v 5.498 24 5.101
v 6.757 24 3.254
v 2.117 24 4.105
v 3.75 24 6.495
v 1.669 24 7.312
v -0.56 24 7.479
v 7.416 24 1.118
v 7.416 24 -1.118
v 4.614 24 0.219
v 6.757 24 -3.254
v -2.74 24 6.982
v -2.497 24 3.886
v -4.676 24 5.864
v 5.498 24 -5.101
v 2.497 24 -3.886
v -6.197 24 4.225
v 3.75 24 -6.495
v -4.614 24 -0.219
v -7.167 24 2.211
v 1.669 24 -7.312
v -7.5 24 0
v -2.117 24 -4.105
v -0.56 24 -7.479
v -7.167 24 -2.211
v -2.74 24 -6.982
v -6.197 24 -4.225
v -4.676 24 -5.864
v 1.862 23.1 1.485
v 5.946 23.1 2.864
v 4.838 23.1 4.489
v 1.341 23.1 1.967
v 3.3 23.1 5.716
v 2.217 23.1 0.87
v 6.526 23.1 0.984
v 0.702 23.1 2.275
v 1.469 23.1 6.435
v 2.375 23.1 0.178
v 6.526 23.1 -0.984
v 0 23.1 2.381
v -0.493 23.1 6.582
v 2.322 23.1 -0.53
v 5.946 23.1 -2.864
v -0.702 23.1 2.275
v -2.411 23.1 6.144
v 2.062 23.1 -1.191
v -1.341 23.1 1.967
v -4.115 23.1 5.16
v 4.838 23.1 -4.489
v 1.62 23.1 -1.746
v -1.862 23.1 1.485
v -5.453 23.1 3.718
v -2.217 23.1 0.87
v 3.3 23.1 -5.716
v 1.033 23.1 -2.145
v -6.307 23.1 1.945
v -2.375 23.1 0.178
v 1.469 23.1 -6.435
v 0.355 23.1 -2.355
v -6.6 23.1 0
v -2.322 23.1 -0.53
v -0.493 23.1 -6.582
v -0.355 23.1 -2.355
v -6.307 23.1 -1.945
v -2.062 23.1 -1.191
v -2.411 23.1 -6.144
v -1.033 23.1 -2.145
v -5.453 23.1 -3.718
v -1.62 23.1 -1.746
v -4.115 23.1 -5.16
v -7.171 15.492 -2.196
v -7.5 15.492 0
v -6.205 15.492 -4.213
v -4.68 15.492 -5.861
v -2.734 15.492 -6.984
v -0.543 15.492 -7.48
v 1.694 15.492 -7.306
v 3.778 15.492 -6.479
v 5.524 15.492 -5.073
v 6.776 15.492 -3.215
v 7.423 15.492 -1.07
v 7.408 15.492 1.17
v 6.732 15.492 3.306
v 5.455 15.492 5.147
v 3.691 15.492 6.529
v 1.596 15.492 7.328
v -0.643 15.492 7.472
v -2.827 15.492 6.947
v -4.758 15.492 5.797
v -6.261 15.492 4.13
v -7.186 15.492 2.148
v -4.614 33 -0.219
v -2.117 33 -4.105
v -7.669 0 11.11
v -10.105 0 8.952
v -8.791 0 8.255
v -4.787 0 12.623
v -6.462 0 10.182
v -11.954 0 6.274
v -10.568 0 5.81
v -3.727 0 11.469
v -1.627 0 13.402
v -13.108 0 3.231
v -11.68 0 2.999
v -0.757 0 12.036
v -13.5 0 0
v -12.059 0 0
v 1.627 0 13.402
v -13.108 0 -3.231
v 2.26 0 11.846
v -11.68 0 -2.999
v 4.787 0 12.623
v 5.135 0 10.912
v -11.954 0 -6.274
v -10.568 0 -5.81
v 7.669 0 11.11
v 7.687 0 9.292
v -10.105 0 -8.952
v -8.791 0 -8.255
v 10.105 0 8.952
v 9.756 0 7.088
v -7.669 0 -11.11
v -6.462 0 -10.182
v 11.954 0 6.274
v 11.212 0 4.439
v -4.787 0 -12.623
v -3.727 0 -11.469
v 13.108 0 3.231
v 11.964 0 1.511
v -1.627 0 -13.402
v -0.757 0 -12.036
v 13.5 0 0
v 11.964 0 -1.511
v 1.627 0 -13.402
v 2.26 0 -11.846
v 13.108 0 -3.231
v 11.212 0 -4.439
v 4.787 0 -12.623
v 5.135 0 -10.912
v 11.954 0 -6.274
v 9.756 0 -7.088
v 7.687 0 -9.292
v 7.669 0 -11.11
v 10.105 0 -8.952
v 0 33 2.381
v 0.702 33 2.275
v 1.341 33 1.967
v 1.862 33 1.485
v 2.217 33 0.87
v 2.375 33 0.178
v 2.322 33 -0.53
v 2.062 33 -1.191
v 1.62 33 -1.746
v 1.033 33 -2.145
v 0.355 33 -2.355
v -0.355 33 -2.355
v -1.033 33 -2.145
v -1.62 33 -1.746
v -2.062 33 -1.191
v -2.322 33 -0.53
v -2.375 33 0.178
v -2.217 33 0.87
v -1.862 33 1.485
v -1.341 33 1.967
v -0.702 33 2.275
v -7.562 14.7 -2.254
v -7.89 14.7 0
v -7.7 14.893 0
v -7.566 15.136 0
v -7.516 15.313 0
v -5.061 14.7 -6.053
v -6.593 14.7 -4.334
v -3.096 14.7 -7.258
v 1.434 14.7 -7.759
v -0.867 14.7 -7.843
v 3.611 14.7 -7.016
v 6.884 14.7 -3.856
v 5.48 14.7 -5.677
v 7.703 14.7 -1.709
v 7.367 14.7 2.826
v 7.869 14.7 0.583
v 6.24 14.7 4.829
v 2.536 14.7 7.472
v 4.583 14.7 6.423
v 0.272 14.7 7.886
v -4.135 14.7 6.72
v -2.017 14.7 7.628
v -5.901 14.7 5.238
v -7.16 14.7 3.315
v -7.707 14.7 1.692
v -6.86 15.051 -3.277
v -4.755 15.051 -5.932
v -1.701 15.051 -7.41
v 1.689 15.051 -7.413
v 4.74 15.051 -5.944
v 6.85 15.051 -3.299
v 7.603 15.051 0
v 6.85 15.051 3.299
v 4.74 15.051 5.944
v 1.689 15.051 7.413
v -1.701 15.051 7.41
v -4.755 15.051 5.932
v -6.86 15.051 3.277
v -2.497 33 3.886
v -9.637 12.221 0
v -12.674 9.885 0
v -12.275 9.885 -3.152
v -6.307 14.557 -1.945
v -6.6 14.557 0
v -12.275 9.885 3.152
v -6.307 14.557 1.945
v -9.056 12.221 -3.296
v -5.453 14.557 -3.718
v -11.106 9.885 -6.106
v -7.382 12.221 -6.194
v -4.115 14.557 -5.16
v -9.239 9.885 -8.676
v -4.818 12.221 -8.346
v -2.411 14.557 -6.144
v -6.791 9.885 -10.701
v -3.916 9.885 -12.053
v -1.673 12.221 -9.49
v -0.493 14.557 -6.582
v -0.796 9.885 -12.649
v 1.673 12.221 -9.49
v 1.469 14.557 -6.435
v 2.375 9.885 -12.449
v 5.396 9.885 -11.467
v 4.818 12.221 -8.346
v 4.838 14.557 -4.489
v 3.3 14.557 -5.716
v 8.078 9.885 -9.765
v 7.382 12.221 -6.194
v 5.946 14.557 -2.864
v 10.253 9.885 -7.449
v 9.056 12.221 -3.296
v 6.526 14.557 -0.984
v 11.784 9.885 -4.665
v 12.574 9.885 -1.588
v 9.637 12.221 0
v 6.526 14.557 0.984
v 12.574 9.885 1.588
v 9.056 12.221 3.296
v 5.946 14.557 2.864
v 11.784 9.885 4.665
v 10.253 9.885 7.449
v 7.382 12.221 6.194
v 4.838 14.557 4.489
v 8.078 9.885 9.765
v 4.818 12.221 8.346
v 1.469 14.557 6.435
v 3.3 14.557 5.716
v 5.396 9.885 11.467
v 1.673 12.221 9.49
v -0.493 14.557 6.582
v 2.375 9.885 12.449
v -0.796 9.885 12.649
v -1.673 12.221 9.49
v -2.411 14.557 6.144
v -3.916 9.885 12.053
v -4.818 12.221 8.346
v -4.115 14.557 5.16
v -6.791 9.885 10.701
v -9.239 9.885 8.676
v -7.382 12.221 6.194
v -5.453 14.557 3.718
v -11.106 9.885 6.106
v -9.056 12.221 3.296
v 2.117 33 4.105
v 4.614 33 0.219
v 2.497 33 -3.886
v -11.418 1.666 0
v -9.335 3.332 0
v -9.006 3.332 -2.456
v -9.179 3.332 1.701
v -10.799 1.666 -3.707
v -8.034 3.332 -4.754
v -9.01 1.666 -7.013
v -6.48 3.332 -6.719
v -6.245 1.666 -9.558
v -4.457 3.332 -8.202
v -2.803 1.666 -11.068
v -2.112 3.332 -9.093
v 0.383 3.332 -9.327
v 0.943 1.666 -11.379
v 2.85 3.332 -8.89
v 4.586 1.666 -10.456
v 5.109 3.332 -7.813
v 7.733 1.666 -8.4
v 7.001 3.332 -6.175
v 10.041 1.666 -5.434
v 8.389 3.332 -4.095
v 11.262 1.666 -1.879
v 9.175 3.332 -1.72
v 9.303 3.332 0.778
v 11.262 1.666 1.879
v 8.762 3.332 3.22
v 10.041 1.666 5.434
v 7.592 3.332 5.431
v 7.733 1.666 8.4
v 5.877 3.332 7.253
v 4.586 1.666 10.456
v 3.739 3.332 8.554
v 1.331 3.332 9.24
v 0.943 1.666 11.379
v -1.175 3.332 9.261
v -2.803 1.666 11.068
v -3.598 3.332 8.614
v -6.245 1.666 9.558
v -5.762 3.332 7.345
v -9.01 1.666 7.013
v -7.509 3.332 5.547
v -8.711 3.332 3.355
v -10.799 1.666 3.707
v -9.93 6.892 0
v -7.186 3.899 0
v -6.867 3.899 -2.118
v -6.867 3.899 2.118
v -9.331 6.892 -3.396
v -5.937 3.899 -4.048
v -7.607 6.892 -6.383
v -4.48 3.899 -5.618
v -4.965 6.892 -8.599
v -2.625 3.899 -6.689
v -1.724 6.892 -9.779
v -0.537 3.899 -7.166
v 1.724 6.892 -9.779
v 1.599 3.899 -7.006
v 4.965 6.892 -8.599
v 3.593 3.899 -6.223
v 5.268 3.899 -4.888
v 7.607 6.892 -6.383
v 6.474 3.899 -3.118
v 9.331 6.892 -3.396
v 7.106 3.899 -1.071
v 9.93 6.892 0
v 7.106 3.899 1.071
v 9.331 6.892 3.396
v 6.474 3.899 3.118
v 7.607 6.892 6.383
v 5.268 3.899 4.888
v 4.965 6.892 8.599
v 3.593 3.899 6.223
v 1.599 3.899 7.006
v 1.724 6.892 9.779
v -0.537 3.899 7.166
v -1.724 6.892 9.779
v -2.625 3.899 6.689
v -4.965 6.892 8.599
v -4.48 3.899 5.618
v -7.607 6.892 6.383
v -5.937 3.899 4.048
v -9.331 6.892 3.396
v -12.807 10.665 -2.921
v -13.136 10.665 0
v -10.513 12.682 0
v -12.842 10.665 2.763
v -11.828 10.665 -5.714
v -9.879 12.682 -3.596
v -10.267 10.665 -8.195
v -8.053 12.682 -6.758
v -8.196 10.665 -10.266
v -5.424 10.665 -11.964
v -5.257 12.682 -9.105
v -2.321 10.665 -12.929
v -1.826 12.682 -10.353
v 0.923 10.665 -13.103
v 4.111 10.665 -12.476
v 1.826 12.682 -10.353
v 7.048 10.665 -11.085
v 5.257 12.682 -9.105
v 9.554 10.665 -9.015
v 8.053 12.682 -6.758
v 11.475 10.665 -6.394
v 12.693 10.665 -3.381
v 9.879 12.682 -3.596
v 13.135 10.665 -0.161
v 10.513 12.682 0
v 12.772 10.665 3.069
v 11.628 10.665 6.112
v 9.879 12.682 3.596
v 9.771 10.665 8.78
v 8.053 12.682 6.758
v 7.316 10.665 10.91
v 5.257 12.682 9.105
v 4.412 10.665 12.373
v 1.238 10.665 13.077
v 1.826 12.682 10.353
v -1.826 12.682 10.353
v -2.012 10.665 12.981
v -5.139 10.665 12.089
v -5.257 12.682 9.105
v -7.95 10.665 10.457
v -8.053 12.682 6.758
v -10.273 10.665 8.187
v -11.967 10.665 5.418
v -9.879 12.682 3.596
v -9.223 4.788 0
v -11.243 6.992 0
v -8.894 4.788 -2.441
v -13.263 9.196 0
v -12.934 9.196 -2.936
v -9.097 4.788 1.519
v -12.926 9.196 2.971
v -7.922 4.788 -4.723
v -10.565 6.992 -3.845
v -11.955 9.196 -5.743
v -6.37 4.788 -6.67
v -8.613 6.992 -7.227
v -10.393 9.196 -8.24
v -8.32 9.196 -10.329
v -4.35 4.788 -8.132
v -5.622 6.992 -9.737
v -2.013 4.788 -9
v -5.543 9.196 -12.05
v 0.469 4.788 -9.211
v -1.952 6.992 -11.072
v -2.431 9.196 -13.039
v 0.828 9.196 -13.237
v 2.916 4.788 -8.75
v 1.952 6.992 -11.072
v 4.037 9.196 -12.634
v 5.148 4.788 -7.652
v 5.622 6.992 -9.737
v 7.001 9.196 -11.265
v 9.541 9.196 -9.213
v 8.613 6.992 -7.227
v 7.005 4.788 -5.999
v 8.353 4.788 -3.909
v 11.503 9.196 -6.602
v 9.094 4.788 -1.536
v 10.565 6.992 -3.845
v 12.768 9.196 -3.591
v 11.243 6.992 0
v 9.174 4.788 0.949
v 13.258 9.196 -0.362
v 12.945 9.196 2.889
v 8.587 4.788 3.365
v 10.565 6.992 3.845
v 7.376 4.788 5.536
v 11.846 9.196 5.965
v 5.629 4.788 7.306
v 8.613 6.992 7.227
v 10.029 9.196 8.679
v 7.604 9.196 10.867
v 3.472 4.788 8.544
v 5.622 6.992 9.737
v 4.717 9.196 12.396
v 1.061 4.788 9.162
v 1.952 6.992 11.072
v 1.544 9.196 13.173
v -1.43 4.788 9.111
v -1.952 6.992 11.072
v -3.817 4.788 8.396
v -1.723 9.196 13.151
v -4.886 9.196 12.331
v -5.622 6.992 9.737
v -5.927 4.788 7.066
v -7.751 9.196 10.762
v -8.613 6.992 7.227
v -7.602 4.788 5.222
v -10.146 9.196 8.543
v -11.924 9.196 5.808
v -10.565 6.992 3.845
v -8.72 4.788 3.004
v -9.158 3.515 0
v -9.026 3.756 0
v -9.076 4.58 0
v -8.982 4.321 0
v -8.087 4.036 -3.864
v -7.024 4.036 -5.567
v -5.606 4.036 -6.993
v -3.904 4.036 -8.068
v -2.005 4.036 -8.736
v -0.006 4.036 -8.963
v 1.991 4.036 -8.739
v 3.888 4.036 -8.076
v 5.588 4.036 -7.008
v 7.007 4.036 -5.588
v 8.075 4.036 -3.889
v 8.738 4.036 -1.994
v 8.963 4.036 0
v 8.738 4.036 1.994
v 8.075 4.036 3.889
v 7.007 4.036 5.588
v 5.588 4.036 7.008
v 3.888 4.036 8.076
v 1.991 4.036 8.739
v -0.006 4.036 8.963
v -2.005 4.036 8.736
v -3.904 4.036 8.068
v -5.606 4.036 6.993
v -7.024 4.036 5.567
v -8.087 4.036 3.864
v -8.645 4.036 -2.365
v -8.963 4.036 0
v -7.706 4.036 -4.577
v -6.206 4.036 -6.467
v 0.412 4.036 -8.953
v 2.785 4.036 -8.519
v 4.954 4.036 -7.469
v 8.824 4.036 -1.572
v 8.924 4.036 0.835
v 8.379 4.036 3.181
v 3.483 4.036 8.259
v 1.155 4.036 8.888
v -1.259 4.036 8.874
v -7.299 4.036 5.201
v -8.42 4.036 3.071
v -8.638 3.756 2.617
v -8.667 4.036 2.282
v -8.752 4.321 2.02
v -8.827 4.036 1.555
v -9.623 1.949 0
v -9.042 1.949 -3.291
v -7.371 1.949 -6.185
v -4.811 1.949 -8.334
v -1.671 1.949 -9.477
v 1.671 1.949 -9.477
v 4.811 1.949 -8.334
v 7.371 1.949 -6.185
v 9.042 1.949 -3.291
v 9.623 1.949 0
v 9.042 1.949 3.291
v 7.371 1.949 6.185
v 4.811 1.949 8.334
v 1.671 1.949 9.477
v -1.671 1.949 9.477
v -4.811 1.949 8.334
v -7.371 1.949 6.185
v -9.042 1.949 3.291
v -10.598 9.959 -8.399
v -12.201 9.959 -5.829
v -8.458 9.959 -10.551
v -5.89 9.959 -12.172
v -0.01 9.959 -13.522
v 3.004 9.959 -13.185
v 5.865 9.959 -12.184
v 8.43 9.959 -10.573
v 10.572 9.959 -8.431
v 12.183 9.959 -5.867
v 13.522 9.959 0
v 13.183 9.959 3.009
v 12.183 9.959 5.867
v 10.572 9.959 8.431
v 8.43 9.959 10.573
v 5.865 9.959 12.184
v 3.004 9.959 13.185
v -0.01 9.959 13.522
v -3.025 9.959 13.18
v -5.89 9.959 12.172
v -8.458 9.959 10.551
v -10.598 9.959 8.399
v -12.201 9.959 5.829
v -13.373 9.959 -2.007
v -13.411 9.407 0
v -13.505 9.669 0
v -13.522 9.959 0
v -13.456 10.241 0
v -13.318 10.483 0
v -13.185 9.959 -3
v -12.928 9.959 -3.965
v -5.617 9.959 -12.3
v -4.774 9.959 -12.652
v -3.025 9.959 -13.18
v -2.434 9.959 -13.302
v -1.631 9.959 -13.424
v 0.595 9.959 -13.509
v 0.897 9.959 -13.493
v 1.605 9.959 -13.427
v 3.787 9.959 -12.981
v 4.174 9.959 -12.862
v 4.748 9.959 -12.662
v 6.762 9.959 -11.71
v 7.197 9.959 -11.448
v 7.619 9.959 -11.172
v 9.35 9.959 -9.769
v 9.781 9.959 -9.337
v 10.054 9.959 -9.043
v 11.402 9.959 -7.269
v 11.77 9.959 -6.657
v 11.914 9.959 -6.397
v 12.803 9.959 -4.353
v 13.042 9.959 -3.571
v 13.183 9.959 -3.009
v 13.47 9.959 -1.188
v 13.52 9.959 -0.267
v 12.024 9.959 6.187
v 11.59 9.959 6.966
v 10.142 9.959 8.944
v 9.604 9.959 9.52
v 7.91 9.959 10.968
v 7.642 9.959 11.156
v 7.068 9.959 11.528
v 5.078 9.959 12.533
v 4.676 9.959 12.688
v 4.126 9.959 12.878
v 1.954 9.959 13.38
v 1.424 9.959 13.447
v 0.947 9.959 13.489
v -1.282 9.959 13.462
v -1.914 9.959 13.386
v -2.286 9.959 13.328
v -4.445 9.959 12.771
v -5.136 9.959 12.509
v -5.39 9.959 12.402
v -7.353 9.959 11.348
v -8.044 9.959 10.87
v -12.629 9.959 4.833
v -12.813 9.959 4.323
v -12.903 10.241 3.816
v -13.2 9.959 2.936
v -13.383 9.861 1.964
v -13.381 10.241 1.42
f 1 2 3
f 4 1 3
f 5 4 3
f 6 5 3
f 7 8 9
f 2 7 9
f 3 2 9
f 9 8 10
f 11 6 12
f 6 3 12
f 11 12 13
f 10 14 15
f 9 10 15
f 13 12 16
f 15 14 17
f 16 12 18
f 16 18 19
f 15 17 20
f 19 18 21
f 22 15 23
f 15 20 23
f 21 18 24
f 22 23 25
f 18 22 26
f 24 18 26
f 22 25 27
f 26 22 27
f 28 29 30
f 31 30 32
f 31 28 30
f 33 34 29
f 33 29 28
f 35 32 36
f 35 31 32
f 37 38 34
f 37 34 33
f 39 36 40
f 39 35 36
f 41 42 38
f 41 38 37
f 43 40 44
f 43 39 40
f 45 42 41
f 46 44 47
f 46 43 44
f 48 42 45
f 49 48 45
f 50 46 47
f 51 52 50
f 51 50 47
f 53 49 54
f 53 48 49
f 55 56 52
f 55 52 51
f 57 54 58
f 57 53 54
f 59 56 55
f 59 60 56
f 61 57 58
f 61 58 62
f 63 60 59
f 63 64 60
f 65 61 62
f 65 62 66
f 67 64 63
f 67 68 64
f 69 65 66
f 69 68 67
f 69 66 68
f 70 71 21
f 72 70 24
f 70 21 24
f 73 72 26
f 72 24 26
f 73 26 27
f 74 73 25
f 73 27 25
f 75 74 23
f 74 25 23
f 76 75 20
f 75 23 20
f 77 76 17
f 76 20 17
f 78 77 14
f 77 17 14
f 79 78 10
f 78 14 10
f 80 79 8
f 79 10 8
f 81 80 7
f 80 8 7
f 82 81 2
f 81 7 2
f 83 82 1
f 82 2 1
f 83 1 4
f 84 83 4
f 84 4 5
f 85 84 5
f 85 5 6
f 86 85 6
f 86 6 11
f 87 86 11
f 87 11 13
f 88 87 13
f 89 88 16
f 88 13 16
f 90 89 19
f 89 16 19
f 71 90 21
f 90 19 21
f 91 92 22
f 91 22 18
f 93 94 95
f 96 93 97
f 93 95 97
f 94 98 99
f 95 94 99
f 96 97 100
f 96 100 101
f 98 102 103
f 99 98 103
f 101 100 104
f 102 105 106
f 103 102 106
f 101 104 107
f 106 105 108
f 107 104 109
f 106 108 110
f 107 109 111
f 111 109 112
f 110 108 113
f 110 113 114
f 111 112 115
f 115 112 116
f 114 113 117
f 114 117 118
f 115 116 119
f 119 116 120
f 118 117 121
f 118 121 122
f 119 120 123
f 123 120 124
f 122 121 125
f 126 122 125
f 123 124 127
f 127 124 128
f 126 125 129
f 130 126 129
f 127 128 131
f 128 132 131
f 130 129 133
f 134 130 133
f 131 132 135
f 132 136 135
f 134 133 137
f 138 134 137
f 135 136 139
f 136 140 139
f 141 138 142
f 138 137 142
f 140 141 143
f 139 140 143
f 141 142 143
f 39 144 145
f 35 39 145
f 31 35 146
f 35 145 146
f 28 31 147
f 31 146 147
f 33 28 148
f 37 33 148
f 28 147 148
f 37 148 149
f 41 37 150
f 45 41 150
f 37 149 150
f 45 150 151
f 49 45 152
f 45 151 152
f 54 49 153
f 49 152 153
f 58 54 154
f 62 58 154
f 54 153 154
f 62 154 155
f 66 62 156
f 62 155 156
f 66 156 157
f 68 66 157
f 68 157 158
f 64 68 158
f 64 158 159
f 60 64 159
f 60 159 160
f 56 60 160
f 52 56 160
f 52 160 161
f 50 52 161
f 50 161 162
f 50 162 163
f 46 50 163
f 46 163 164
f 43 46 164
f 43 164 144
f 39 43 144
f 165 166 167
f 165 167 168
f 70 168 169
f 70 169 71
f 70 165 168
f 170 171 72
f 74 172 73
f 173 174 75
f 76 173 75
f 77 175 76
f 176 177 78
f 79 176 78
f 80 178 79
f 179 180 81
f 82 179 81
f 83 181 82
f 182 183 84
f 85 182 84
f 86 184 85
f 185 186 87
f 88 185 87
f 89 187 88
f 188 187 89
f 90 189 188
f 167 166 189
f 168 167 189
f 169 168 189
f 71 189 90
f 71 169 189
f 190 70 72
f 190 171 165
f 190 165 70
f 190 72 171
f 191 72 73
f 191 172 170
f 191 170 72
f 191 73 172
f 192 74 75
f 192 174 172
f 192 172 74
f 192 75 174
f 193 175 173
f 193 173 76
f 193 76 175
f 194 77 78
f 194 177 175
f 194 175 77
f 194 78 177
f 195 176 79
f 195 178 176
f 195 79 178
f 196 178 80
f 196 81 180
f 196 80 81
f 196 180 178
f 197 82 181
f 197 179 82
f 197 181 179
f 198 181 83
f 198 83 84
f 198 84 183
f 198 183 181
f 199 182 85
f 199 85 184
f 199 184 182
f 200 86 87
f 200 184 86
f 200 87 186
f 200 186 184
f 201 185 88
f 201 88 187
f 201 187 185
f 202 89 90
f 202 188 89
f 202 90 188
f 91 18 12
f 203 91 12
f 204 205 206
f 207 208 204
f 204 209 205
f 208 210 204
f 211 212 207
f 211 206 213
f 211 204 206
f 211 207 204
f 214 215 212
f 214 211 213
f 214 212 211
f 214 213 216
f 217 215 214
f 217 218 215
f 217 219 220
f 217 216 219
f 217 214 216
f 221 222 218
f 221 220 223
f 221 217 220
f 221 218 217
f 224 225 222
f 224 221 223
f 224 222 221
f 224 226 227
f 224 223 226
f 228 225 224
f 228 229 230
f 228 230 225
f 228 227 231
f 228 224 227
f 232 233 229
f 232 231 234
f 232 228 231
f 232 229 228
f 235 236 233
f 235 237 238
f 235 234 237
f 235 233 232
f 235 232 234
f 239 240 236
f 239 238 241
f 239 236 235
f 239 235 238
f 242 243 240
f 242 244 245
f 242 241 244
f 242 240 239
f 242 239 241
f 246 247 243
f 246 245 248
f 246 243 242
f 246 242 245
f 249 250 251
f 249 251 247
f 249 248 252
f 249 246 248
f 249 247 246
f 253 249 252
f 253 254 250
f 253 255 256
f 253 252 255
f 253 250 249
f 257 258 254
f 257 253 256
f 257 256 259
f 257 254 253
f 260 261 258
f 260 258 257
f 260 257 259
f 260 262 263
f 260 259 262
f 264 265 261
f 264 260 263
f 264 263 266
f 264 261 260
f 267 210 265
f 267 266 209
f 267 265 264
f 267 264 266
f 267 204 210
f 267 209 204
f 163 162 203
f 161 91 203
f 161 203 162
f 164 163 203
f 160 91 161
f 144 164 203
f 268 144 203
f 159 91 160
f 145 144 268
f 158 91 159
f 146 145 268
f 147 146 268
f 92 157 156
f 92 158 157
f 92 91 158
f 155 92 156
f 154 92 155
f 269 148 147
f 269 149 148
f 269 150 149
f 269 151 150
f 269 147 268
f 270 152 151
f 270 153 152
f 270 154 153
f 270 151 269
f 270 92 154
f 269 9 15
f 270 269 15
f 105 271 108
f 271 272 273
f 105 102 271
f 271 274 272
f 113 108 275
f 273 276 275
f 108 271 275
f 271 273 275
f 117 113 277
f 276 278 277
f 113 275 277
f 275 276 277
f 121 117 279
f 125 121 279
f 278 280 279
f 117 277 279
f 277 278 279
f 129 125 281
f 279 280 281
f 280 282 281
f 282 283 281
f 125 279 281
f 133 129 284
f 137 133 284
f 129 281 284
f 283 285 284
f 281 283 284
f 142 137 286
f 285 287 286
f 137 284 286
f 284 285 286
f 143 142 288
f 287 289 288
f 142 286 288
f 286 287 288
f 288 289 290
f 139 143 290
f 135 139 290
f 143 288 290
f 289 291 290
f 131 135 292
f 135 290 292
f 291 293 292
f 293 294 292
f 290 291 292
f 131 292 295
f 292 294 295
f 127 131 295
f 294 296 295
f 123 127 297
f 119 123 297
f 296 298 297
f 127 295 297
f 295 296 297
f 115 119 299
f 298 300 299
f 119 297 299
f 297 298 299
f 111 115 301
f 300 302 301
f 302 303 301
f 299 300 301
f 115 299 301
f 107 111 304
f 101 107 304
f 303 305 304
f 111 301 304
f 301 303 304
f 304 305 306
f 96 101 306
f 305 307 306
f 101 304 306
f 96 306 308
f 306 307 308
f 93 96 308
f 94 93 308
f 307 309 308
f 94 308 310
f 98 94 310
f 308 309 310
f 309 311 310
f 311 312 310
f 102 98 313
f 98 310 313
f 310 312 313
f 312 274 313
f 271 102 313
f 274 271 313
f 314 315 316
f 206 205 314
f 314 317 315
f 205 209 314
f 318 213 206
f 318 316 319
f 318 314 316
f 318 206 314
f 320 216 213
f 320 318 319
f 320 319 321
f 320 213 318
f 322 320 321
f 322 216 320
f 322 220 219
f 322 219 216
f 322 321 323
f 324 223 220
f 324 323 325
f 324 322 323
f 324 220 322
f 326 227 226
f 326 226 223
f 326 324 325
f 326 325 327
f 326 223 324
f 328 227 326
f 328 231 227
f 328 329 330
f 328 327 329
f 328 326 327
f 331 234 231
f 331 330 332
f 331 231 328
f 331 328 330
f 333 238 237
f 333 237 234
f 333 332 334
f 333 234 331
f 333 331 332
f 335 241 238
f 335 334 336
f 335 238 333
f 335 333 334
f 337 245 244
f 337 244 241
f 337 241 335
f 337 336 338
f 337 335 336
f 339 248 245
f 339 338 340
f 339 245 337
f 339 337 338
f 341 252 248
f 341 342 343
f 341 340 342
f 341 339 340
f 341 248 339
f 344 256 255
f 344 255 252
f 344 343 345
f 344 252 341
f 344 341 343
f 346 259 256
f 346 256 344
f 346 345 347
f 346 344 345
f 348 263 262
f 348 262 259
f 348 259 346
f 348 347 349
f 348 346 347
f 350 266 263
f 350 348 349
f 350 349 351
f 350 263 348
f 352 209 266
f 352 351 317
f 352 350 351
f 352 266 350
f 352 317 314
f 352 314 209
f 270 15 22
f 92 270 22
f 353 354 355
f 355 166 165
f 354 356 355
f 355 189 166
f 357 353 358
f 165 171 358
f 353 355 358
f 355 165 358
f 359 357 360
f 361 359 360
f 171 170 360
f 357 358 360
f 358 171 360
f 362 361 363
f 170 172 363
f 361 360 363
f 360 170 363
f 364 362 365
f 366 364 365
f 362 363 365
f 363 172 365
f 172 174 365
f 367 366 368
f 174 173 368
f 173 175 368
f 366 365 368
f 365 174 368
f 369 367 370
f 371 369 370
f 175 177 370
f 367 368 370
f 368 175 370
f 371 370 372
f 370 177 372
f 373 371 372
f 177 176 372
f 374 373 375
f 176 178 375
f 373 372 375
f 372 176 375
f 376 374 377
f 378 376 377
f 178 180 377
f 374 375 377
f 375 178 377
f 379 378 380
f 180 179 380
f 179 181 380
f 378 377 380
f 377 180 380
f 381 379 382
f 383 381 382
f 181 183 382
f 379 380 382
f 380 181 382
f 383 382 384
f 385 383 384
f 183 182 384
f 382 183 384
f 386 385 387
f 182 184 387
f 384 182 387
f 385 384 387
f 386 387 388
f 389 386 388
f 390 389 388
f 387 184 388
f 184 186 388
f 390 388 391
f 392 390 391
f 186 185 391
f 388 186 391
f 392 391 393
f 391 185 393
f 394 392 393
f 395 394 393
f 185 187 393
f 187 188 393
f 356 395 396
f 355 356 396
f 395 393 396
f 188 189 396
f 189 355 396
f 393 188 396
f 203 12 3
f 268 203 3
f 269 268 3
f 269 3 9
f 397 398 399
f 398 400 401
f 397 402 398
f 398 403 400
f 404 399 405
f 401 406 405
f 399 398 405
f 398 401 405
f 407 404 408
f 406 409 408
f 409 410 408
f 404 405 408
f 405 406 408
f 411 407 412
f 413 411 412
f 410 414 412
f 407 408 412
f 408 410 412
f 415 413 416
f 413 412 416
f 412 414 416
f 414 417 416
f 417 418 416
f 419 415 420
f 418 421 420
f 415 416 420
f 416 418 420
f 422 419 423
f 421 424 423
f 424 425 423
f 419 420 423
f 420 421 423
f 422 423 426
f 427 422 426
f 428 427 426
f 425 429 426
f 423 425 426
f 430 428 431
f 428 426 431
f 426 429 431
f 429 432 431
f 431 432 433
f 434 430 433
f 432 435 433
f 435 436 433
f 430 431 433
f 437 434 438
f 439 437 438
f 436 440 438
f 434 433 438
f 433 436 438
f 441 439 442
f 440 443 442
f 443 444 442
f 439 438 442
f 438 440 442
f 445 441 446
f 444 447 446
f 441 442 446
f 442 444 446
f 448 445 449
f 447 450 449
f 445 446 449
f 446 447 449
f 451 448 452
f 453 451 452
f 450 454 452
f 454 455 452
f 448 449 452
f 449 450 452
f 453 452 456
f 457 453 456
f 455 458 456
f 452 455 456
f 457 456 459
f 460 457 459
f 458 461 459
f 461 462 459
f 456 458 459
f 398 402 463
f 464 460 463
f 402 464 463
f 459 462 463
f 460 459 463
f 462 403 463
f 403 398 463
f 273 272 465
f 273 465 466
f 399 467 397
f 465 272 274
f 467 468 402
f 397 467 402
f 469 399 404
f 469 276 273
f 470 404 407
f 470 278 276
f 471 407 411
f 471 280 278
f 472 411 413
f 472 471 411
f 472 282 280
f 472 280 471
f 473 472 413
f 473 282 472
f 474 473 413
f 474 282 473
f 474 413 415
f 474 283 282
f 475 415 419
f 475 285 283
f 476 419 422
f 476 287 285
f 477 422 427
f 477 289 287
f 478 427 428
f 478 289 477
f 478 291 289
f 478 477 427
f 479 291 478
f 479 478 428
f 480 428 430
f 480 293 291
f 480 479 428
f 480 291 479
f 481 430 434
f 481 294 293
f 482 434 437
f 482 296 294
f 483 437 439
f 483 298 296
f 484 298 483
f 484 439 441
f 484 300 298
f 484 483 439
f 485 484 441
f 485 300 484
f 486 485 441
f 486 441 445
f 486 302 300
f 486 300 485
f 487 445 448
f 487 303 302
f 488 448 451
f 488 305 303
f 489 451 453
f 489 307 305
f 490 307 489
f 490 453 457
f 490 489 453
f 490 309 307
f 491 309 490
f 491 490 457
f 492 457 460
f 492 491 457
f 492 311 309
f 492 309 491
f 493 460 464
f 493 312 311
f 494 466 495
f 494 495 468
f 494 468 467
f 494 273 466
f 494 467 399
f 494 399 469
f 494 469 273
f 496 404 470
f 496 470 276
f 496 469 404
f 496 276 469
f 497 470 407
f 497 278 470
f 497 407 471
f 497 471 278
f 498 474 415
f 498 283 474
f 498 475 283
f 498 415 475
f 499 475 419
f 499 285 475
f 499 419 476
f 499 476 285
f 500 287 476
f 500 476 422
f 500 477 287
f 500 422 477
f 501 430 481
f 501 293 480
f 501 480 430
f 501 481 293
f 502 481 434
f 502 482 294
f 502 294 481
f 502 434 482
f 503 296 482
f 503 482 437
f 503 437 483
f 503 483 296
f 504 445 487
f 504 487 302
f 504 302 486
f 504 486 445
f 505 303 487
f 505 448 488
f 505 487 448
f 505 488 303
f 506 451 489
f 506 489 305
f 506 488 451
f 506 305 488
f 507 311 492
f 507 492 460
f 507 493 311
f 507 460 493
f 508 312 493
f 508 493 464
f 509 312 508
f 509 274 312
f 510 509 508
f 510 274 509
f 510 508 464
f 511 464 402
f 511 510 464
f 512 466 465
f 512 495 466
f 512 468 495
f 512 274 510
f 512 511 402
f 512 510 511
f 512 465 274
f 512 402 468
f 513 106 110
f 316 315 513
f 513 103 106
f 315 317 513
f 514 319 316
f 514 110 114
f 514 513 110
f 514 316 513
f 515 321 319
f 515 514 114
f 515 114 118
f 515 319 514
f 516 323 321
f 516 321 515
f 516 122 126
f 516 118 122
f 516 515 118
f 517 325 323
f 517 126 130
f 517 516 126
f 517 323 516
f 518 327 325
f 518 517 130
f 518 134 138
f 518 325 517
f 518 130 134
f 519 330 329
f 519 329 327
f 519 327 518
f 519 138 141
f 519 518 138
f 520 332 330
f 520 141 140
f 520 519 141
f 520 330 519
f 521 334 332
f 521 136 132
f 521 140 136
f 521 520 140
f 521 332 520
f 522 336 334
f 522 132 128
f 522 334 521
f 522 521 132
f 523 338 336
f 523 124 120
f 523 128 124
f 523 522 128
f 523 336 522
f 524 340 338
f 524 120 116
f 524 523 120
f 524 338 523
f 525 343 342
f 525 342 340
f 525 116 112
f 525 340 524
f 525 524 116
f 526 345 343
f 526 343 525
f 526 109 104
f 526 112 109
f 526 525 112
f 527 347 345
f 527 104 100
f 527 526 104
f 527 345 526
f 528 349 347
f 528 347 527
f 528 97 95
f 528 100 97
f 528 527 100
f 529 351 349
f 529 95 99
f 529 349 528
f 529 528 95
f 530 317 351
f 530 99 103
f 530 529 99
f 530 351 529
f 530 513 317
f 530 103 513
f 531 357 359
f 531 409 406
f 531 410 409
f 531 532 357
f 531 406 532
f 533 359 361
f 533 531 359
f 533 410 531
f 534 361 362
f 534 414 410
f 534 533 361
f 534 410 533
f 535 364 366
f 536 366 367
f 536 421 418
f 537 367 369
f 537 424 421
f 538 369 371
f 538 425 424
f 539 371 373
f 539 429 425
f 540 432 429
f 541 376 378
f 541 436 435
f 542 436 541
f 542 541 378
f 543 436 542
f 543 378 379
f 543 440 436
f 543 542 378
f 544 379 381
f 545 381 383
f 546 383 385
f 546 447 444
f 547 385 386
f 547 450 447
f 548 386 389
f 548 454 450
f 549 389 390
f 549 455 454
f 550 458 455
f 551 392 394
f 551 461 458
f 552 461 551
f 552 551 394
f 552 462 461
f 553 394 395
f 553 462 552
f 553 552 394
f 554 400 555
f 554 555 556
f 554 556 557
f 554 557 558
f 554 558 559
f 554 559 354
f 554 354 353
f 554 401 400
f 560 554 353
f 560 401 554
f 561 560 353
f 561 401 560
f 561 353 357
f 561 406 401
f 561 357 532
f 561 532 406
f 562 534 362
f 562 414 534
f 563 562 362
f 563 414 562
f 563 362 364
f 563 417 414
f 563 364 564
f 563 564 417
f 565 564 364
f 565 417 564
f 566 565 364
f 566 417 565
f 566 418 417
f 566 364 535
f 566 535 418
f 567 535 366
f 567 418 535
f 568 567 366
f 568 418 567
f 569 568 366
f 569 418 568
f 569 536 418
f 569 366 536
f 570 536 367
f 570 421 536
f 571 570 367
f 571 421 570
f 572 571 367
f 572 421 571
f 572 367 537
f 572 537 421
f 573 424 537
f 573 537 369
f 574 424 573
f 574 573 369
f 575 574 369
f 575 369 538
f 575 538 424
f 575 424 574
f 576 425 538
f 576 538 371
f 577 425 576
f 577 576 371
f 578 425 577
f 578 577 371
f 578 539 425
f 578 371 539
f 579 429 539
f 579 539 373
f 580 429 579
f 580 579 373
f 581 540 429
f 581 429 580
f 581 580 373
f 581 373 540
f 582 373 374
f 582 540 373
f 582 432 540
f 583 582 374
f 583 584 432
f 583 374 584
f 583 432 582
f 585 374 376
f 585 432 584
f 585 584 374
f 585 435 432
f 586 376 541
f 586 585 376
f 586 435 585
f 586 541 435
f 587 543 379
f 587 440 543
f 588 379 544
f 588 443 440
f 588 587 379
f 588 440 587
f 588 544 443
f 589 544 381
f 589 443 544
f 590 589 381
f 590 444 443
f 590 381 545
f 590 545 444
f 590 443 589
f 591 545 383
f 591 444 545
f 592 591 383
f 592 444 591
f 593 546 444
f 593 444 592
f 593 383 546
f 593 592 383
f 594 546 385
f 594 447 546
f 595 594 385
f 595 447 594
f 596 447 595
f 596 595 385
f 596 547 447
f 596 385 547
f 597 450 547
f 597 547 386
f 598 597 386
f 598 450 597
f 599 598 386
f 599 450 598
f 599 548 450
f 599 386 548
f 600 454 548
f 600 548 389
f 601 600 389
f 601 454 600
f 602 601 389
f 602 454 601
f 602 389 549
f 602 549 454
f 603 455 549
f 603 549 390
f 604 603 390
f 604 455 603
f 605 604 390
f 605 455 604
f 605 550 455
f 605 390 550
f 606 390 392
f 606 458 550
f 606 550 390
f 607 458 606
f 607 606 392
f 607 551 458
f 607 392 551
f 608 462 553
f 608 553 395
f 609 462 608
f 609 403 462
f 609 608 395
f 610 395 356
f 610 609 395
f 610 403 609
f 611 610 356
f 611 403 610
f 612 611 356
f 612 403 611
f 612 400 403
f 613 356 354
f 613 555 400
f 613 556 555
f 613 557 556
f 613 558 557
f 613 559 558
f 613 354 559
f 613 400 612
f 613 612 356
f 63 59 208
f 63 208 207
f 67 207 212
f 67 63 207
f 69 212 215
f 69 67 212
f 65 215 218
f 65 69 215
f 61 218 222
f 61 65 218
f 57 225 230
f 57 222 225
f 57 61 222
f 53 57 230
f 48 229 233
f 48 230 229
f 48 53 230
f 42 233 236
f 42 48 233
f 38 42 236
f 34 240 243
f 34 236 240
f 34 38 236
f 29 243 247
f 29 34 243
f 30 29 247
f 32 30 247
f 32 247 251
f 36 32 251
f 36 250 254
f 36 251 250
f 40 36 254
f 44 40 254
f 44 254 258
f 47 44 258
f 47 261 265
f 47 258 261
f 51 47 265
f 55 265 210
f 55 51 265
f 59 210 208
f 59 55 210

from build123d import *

# Parameters (mm, degrees)
CASCA1_T                 = -0.9
RESSALTO_EXTRUS_O1_DEPTH = 9
FILETE1_R                = 1
ESBO_O3_R                = 2.38125
CORTE_EXTRUS_O1_DEPTH    = 39.143338529


with BuildPart() as part:
    # Esboço1 → Revolução1 (revolve)
    with BuildSketch(Plane.XY, mode=Mode.PRIVATE) as revolu_o1_sk:
        Polygon((0, 0), (13.5, 0), (8.5, 4), (14, 10), (7.5, 15), (7.5, 24), (0, 24), align=None)
    revolve(revolu_o1_sk.sketch.rotate(Axis((0, 24, 0), (0, -1, 0)), 180), axis=Axis((0, 24, 0), (0, -1, 0)))

    # Casca1
    casca1_openings = [part.faces().sort_by_distance(p)[0] for p in [
        (0, 0, 0),
    ]]
    offset(amount=CASCA1_T, openings=casca1_openings, kind=Kind.INTERSECTION)

    # Esboço2 → Ressalto-extrusão1 (add)
    with BuildSketch(Plane(origin=(0, 24, 0), x_dir=(1, 0, 0), z_dir=(0, 1, 0))):
        Polygon((2.496763598, 3.885808136), (-2.11682676, 4.105164771), (-4.613590359, 0.219356636), (-2.496763598, -3.885808136), (2.11682676, -4.105164771), (4.613590359, -0.219356636), align=None)
    extrude(amount=RESSALTO_EXTRUS_O1_DEPTH)

    # Filete1
    filete1_edges = [part.edges().sort_by_distance(p)[0] for p in [
        (7.5, 15, 0),
        (14, 10, 0),
        (8.5, 4, 0),
    ]]
    fillet(filete1_edges, radius=FILETE1_R)

    # Esboço3 → Corte-extrusão1 (cut, through all)
    with BuildSketch(Plane(origin=(0, 33, 0), x_dir=(1, 0, 0), z_dir=(0, 1, 0))):
        with Locations(Location((0, 0, 0), (0, 0, 270))):
            Circle(ESBO_O3_R)
    extrude(amount=-CORTE_EXTRUS_O1_DEPTH, mode=Mode.SUBTRACT)


solid = part.part
